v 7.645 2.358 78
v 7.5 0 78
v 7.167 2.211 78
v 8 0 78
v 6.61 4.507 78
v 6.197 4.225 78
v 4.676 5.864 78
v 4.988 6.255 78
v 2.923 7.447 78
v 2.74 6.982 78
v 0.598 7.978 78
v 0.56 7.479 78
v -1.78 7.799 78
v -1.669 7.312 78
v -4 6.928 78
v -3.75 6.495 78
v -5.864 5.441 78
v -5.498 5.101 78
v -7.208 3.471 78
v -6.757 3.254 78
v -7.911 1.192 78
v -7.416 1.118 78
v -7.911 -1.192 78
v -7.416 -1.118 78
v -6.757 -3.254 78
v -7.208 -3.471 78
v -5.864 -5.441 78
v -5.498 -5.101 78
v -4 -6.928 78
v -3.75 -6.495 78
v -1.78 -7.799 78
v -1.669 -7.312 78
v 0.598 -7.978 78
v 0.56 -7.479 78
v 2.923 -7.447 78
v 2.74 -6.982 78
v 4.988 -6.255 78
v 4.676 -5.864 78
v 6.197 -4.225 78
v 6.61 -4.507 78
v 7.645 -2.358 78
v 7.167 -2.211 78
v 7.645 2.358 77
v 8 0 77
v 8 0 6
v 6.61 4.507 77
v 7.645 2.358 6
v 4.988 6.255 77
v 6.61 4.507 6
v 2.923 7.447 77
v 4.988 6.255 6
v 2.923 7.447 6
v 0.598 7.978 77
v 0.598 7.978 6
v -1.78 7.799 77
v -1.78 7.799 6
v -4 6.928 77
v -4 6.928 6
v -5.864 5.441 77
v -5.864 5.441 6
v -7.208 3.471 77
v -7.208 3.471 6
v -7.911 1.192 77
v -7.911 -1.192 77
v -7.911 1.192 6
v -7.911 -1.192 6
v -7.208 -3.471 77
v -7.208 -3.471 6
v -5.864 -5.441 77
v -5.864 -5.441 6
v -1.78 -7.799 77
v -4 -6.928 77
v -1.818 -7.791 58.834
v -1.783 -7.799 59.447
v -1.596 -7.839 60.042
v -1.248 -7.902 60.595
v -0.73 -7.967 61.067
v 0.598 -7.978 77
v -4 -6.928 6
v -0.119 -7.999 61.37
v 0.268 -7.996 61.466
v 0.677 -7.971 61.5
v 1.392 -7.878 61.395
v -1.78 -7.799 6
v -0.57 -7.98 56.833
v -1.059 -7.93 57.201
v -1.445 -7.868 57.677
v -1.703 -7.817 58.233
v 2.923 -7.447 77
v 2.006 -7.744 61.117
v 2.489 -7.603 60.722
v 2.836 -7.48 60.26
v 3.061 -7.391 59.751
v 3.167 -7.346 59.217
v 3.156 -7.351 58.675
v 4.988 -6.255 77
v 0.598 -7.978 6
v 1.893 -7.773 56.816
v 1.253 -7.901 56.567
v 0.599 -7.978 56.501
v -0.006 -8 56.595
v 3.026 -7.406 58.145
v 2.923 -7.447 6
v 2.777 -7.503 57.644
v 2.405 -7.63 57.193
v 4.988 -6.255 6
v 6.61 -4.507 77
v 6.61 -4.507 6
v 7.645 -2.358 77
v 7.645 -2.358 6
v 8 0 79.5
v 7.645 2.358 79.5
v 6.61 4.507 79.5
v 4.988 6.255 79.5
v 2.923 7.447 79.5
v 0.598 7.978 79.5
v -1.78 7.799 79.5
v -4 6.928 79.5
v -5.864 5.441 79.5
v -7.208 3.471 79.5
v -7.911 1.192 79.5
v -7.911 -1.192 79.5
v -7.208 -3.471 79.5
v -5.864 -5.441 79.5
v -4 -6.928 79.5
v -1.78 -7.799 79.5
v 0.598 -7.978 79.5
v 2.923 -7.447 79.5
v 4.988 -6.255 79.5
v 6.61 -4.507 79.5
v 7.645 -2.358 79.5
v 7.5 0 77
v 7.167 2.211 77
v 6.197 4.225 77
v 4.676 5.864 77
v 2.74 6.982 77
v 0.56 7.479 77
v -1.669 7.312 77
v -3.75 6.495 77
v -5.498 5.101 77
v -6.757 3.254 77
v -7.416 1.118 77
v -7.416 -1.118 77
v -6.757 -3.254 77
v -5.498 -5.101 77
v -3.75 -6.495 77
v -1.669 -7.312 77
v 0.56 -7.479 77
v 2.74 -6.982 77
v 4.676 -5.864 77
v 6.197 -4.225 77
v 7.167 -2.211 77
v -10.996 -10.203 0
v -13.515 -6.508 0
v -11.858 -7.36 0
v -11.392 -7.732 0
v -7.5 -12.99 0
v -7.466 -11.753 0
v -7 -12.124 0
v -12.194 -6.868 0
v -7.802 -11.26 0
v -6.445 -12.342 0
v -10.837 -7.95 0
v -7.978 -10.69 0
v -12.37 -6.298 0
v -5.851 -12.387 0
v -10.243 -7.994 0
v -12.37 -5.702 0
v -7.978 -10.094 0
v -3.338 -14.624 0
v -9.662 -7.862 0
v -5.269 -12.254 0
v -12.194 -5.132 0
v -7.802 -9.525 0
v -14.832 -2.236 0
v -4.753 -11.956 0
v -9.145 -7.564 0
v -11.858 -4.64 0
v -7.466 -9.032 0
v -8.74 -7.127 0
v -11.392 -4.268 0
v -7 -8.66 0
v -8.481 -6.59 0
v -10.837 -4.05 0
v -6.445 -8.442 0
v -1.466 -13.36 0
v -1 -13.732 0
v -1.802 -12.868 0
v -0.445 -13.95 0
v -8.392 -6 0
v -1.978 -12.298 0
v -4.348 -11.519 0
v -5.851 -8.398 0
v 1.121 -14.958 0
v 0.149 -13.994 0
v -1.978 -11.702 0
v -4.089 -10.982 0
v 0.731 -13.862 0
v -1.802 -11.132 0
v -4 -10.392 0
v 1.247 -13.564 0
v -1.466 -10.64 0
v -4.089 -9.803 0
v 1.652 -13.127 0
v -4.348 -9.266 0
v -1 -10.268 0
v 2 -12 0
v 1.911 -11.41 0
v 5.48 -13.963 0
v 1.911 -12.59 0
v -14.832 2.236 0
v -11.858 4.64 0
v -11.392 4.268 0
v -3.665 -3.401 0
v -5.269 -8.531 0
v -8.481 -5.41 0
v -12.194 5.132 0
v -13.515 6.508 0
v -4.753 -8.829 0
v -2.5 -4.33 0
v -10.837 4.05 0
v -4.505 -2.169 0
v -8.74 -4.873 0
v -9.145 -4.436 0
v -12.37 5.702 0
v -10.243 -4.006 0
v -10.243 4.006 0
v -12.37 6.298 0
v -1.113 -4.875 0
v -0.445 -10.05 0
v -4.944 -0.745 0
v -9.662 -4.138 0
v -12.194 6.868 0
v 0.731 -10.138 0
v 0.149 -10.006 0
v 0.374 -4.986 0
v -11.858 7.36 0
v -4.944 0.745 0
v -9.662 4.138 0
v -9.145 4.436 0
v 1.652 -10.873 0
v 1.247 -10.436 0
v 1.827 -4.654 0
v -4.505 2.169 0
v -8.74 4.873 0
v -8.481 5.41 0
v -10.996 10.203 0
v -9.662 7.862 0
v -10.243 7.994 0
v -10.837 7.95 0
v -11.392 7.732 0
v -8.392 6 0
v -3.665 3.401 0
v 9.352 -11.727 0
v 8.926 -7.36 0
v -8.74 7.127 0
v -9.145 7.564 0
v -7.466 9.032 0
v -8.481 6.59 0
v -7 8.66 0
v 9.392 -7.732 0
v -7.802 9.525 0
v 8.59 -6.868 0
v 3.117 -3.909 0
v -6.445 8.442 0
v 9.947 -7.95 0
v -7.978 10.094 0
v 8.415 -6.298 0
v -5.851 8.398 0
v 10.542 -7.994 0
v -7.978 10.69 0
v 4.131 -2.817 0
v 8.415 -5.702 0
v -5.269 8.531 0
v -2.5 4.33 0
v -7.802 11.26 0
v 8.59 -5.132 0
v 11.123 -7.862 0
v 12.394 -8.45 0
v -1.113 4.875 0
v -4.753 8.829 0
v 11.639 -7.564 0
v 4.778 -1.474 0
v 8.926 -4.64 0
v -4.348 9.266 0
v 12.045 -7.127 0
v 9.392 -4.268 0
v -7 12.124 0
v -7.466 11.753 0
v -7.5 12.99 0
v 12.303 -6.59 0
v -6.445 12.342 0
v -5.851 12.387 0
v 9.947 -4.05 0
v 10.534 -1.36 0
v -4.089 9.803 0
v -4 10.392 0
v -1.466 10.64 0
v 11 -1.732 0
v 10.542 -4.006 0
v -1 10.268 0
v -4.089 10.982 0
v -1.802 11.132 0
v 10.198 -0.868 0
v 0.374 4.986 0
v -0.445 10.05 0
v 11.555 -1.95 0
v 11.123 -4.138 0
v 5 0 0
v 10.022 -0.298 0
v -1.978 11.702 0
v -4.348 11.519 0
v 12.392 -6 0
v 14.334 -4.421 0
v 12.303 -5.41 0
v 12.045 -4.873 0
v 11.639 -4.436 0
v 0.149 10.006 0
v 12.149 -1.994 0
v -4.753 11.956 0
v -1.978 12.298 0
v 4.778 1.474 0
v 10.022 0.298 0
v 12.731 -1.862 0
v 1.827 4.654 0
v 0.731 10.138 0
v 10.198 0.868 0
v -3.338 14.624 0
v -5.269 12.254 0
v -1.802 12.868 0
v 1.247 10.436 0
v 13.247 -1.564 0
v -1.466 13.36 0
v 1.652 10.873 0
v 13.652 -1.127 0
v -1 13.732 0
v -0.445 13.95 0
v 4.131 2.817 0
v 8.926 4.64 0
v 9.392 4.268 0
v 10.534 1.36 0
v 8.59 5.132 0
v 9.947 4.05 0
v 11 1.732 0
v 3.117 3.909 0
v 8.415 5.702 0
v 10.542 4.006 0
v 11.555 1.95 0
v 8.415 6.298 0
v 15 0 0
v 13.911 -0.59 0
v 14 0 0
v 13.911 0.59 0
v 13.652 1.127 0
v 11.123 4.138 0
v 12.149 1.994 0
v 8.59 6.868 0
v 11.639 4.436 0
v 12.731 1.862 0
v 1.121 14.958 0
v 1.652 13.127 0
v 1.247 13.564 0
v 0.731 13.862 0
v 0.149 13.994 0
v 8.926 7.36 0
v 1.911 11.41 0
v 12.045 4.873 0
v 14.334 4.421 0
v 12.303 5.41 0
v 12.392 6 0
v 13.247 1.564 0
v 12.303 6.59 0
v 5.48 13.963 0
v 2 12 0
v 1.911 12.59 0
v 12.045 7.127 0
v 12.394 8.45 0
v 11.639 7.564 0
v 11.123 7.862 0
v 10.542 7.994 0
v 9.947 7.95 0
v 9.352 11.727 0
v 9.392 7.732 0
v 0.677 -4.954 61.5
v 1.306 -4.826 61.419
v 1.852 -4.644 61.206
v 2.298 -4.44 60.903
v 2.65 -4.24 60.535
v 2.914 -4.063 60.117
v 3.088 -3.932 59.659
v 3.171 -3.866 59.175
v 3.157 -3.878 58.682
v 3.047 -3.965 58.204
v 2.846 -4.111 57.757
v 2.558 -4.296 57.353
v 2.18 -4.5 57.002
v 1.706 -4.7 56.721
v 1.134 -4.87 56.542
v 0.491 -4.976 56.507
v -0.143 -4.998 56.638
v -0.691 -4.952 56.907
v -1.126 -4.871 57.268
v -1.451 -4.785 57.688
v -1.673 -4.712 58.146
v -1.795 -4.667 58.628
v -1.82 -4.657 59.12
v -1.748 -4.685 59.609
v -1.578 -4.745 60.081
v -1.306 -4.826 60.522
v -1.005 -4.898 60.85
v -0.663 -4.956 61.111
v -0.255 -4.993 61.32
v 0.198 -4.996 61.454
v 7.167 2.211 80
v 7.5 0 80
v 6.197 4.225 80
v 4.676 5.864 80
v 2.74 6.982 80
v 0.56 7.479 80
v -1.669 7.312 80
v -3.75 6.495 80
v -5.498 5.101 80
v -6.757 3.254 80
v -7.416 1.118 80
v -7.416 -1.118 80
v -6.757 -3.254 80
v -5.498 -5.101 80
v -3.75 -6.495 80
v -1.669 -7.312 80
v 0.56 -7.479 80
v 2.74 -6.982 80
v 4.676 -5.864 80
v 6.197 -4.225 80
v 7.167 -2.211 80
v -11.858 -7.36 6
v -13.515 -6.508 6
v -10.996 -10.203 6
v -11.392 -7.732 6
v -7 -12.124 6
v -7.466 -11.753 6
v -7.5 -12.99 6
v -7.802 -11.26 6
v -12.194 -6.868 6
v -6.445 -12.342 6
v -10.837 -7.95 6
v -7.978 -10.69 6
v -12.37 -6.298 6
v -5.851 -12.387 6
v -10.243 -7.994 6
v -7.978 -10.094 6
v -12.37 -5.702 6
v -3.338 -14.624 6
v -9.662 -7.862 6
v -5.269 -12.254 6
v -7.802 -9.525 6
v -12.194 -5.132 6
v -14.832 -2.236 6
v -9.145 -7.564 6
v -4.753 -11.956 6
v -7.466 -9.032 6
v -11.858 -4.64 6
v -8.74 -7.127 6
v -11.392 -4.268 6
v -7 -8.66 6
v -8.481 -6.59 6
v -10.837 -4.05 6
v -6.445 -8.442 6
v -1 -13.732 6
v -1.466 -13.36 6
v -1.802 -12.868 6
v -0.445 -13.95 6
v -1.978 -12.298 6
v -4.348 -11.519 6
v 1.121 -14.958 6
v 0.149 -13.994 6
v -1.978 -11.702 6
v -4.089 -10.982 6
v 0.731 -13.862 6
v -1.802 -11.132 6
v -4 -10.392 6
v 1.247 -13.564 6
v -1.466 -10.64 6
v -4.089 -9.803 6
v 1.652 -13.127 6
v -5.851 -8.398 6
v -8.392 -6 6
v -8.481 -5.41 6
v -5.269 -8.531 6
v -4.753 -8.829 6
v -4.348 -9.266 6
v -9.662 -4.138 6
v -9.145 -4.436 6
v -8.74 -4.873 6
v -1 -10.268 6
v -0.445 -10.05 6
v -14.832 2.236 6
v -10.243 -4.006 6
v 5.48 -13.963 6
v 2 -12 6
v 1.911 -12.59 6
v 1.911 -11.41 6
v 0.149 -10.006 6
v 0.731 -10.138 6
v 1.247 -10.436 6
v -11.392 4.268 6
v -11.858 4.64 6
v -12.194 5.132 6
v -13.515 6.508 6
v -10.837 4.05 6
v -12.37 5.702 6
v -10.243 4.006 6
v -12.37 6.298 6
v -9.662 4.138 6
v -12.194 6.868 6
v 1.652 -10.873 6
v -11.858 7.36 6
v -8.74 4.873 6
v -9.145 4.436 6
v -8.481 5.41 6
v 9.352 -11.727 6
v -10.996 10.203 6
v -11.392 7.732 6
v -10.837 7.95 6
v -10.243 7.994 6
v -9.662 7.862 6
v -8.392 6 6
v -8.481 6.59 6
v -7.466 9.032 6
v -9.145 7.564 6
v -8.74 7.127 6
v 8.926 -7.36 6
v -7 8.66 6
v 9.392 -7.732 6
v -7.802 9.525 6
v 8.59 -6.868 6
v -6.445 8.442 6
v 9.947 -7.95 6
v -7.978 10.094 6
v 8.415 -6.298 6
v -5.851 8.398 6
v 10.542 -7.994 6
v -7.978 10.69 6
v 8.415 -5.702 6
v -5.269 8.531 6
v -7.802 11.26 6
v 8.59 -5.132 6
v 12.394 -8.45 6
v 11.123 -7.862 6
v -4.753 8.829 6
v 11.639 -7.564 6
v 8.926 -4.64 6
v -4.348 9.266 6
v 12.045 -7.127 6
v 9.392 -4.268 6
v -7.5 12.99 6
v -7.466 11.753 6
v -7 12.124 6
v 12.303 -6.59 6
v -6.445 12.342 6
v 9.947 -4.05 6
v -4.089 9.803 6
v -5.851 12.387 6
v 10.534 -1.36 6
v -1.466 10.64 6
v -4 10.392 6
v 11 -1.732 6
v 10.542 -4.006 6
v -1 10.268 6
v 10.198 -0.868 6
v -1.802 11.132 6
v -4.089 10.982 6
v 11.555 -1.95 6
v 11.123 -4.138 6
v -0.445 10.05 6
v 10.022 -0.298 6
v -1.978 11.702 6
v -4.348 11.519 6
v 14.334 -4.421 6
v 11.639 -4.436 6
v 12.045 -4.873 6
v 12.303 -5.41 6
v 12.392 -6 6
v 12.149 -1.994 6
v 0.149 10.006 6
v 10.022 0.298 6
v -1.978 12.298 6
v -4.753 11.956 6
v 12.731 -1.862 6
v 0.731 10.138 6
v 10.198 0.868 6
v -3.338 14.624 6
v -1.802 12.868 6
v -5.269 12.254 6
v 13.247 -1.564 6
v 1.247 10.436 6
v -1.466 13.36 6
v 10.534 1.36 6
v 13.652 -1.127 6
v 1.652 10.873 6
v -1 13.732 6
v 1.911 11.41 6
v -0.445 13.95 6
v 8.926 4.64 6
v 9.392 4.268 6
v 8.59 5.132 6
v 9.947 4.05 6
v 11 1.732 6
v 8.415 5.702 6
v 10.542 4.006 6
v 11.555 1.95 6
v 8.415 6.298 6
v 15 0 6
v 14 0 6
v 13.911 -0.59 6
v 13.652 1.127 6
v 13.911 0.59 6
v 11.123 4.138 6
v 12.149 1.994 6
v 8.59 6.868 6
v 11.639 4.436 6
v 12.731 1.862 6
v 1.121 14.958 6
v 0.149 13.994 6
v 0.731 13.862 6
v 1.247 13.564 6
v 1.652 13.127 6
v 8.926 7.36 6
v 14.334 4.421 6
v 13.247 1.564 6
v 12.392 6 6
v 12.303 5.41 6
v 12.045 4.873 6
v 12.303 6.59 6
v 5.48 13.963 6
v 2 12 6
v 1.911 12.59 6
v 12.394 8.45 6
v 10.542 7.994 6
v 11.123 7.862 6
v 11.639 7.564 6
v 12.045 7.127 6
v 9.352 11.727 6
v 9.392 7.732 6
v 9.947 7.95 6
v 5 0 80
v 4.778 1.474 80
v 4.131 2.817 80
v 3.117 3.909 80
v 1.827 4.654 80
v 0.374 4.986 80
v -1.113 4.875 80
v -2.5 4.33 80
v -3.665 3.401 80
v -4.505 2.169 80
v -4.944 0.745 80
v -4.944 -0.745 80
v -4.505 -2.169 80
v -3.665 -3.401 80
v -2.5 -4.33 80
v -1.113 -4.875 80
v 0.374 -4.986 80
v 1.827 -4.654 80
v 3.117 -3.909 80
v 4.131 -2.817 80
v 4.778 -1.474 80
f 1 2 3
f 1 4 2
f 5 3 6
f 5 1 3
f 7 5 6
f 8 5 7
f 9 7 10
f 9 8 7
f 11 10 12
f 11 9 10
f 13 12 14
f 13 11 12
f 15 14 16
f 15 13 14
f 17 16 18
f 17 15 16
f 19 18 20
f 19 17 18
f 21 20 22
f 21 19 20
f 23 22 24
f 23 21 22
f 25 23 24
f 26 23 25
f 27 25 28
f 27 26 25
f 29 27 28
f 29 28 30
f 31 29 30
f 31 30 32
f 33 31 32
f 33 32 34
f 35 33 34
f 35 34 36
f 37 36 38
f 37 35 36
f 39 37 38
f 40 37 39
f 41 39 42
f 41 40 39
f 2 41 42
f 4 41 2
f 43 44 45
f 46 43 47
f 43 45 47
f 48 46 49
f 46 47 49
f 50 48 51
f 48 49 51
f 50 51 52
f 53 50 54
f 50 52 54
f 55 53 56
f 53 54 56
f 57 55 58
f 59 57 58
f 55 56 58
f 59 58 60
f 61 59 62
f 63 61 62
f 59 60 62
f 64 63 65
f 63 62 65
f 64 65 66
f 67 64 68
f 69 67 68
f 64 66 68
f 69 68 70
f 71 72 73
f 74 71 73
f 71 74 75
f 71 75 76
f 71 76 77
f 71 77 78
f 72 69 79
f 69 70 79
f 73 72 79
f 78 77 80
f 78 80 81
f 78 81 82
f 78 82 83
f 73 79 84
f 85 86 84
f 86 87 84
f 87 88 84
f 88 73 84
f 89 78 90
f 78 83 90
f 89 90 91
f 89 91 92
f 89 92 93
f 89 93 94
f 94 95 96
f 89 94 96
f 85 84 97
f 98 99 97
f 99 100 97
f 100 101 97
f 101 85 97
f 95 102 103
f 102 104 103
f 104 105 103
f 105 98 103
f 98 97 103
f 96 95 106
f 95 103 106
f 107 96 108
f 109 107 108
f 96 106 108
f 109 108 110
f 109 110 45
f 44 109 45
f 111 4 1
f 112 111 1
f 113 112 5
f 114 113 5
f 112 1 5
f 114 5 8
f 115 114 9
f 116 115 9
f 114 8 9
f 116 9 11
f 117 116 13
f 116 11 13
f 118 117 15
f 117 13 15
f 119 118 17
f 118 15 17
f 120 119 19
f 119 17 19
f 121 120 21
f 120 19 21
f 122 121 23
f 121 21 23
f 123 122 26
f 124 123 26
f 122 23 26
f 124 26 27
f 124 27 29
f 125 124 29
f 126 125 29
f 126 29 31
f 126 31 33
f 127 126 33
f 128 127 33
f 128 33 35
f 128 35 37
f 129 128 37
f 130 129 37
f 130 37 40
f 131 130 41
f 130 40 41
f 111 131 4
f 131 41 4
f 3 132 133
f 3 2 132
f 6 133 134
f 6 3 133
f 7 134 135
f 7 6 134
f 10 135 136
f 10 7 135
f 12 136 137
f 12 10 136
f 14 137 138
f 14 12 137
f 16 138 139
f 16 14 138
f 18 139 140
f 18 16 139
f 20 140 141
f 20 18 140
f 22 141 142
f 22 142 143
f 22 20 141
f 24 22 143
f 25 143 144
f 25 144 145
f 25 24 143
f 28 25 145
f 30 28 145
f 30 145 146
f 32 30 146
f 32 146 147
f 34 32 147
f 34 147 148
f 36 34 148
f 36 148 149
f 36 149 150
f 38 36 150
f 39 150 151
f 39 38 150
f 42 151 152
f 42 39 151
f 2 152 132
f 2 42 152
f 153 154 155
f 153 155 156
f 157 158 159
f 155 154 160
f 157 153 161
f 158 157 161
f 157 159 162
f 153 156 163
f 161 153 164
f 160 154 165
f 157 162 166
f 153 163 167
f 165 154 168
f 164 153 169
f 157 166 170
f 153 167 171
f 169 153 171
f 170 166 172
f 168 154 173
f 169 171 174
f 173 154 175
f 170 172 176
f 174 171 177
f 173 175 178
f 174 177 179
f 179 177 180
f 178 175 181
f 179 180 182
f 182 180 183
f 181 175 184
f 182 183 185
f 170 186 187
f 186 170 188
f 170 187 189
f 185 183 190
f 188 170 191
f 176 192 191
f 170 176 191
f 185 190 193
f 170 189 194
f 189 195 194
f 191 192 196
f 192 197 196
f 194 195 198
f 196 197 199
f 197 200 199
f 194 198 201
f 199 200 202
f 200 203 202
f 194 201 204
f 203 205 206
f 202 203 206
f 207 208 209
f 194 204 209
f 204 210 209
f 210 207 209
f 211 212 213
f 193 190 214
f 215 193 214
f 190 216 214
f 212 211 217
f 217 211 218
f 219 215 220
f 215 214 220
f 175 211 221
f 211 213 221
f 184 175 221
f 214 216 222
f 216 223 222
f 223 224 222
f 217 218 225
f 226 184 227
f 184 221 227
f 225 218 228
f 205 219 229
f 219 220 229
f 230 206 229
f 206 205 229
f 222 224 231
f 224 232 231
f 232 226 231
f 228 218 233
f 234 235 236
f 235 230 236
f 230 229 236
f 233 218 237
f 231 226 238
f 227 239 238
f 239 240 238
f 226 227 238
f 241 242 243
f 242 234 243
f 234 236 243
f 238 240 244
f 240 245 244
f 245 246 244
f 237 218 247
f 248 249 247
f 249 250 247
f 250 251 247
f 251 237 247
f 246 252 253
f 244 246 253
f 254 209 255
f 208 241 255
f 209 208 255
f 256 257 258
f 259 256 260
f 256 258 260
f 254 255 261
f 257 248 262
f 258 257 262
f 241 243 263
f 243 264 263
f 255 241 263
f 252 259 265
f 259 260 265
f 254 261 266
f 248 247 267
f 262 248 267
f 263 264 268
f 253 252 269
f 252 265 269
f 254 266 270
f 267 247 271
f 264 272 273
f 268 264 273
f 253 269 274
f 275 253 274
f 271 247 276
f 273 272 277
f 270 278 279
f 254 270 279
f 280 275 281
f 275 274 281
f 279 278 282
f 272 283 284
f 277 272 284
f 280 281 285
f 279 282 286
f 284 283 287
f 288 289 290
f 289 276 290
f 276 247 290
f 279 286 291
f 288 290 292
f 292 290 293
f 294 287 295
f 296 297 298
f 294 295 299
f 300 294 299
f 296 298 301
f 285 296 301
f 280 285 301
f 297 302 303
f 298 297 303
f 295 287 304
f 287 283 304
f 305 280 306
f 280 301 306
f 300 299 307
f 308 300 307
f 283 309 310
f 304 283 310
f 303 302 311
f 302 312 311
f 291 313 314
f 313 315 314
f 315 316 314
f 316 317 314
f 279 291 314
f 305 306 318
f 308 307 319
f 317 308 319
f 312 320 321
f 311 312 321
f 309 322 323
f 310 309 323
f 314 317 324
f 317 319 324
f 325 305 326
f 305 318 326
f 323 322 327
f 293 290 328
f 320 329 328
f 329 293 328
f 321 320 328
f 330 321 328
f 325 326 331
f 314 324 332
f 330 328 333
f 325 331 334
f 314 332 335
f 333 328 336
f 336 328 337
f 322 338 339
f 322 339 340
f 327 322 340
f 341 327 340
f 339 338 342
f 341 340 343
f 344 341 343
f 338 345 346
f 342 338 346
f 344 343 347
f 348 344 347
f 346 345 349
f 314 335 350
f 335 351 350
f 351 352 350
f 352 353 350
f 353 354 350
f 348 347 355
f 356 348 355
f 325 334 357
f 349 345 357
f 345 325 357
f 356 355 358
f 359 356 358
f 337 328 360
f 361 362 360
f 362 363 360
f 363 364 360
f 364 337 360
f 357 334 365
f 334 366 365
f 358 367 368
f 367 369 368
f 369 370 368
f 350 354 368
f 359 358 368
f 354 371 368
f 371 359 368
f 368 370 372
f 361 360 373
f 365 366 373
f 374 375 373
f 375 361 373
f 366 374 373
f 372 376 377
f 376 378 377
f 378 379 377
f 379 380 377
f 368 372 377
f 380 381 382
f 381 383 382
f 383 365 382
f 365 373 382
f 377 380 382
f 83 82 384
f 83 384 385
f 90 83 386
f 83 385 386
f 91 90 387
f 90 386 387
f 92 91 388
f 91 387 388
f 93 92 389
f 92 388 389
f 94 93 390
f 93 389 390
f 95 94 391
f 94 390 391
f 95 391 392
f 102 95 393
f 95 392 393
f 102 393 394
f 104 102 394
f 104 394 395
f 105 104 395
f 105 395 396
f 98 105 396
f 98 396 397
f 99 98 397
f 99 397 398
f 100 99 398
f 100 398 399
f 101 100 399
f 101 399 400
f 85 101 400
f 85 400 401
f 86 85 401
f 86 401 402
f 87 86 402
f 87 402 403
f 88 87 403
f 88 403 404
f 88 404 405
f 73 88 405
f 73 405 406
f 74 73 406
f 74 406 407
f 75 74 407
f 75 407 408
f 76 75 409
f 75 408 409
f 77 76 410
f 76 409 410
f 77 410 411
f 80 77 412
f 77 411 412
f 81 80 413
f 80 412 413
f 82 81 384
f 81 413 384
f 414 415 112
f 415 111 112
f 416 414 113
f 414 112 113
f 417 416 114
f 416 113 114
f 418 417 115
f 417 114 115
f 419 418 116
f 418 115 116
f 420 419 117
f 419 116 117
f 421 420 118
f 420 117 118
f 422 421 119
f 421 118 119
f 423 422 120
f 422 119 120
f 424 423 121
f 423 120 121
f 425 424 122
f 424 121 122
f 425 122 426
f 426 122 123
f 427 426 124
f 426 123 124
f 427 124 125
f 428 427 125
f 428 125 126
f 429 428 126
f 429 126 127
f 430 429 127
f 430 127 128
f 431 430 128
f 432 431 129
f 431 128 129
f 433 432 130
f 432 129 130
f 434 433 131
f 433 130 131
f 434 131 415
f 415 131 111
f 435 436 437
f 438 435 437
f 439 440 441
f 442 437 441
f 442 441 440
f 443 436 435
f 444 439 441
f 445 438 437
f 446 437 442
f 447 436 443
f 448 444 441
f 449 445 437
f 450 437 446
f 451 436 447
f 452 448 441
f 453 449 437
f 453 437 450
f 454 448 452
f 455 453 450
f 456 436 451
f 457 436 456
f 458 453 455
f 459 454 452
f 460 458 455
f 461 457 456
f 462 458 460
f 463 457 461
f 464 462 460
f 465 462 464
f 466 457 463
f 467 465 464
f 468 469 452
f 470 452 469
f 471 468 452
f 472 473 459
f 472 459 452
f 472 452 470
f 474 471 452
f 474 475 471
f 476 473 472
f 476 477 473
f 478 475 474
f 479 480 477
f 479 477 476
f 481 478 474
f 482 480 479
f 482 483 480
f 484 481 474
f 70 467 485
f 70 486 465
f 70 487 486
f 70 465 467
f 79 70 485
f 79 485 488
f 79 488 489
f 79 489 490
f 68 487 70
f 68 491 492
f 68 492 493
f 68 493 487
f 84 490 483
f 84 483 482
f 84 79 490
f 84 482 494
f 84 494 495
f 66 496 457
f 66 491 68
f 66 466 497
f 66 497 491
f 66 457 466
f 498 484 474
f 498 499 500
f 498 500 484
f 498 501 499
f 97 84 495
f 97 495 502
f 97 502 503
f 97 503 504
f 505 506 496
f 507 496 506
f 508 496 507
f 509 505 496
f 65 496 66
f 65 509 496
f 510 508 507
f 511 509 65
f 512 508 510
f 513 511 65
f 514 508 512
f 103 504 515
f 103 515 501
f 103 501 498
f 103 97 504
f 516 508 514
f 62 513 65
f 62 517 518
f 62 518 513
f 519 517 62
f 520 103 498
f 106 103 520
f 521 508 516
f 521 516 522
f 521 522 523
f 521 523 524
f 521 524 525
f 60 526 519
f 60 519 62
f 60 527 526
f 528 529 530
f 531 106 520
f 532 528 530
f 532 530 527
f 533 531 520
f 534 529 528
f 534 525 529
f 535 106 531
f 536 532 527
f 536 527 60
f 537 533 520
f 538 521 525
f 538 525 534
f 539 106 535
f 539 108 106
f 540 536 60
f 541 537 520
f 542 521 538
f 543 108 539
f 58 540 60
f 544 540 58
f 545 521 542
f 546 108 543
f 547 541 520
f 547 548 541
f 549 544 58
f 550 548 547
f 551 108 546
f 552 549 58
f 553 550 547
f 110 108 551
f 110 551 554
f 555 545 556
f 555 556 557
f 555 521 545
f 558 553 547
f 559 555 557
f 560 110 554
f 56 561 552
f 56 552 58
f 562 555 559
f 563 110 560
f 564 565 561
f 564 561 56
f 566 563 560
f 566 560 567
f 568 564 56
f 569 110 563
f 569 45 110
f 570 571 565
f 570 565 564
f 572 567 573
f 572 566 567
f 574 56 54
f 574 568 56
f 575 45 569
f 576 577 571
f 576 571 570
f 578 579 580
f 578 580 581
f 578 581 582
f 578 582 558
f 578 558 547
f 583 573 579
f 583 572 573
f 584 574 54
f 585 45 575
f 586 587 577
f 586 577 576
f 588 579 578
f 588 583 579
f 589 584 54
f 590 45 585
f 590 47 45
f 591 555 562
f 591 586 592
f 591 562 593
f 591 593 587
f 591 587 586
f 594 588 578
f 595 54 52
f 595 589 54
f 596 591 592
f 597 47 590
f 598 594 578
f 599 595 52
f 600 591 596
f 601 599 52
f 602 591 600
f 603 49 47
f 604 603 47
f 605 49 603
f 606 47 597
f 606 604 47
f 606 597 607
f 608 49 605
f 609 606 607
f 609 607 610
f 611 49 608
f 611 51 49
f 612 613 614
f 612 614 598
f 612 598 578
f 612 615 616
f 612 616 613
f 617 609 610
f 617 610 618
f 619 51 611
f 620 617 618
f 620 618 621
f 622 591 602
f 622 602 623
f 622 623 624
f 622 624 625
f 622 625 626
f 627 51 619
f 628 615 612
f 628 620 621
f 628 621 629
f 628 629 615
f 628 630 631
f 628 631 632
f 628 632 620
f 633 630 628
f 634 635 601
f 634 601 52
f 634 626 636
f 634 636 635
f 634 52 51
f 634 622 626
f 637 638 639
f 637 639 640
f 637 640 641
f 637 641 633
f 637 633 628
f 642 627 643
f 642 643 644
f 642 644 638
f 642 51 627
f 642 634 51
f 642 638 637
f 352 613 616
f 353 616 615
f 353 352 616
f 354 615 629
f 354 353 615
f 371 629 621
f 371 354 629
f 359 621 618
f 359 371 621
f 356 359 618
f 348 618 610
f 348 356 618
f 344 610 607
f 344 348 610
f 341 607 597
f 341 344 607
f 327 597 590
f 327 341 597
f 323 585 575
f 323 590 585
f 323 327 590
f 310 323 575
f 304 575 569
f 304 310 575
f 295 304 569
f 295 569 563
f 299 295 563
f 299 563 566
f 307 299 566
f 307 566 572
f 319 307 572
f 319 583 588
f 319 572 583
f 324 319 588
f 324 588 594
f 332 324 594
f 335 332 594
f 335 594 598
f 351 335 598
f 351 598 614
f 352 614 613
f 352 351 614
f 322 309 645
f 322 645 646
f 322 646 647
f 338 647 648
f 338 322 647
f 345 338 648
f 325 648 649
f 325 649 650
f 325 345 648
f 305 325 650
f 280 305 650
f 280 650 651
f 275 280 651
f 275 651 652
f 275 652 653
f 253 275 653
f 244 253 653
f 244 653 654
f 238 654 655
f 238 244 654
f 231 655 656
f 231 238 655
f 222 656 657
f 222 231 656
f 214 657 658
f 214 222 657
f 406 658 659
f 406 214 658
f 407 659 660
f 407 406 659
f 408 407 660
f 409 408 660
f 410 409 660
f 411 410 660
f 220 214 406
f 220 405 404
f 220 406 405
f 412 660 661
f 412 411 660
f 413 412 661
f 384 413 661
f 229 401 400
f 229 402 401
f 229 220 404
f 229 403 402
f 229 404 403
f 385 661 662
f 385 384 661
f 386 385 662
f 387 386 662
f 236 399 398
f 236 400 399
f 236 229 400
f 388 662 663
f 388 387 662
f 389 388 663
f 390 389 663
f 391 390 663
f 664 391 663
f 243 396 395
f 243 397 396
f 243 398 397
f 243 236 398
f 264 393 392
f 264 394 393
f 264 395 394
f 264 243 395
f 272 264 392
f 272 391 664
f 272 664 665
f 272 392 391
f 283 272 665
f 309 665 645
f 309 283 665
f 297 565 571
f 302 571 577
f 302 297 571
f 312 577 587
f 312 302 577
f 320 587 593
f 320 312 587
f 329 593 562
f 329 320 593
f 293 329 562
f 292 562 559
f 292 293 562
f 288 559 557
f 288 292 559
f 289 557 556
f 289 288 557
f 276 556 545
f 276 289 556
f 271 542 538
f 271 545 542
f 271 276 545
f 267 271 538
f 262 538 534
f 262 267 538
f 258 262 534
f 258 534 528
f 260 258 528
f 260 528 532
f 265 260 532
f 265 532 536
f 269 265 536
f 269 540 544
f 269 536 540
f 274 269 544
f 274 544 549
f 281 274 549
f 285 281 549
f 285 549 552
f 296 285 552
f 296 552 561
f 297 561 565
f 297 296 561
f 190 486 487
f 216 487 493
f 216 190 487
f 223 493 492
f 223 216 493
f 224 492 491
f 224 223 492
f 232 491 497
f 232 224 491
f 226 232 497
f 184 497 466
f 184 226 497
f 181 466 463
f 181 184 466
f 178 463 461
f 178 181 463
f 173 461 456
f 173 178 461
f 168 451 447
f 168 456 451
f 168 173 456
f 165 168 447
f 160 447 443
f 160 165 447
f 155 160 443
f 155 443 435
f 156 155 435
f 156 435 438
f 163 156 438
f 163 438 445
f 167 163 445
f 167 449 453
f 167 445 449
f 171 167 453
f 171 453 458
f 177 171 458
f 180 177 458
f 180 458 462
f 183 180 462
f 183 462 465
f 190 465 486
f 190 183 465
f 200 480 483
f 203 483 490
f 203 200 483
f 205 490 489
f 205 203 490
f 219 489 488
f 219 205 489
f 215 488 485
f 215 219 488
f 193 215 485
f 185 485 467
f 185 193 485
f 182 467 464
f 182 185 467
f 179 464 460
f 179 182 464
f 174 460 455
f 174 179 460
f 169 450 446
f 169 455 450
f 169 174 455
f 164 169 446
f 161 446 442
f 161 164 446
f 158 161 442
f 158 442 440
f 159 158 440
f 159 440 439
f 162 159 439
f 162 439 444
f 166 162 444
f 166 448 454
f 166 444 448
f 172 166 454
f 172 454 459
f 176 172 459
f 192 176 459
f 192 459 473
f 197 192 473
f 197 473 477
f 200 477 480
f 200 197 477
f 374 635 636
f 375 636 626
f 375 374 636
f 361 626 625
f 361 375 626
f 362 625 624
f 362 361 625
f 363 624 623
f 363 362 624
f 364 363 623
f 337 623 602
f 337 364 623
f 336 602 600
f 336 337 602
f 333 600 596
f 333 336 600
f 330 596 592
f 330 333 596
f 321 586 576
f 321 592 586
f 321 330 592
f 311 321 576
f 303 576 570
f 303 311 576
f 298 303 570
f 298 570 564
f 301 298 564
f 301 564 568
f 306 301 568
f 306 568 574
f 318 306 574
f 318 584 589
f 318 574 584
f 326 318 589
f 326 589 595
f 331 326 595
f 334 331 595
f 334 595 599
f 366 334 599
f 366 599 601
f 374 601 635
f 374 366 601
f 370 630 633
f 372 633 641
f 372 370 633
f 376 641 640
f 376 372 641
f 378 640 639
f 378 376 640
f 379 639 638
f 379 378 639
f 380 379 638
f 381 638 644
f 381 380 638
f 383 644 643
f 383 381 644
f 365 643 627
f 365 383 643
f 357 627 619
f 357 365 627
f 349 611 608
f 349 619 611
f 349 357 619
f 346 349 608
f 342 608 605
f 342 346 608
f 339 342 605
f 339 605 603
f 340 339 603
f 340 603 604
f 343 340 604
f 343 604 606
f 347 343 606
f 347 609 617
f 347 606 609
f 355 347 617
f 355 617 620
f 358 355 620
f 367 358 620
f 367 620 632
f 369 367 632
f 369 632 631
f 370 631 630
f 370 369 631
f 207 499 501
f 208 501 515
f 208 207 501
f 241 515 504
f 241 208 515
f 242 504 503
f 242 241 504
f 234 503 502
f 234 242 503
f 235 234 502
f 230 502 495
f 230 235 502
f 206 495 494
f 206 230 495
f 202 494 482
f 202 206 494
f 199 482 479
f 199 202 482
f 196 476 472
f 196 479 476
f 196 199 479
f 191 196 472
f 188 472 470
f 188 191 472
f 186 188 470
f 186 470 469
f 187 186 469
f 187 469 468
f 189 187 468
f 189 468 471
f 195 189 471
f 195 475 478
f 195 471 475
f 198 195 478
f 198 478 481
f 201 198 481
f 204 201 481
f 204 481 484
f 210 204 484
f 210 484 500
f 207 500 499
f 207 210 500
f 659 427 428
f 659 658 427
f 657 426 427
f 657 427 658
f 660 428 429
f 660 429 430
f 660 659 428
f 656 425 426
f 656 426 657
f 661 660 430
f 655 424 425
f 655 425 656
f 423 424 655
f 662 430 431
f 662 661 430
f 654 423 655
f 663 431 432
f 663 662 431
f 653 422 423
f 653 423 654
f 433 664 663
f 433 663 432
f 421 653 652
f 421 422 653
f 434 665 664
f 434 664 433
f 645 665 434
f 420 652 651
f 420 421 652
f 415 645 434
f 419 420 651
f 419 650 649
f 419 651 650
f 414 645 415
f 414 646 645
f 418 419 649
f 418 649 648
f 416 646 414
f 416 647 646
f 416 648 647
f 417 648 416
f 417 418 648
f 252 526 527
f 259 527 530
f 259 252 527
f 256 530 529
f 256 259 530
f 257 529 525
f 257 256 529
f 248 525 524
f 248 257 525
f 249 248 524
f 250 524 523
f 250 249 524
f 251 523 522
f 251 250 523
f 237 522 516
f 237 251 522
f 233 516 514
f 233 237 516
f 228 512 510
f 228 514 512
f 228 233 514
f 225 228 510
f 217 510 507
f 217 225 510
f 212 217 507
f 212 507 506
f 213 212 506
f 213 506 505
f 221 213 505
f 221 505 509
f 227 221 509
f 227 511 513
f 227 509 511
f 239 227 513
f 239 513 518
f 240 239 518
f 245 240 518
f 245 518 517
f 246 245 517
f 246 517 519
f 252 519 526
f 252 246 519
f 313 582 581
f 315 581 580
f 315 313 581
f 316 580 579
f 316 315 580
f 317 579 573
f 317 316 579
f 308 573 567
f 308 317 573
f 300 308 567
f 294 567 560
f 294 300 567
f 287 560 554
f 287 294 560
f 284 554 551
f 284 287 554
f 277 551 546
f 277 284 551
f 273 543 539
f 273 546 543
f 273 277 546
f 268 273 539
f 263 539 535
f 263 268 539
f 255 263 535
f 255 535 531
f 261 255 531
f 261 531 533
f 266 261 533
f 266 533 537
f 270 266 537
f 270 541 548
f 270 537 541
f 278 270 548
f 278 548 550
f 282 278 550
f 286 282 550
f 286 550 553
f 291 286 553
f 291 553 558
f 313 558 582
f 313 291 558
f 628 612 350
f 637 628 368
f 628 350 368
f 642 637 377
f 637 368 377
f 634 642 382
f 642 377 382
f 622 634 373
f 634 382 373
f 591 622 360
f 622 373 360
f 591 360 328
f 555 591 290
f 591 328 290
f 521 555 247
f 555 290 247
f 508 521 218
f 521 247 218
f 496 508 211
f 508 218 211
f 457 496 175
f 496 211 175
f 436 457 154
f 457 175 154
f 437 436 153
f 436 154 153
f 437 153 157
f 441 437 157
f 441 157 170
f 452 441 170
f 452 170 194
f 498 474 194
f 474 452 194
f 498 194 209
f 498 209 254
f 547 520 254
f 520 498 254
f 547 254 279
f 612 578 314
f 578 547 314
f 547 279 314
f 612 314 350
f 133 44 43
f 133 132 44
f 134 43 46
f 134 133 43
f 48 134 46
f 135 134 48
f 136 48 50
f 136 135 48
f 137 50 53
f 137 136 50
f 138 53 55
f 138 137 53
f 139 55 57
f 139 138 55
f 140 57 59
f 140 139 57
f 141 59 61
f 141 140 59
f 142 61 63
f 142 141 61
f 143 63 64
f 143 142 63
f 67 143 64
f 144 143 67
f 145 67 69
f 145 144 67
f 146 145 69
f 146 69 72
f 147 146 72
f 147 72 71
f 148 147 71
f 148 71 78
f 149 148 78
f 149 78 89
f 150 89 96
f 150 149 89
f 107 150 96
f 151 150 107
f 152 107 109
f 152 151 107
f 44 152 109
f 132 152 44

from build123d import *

# Parameters (mm, degrees)
SKETCH_1_R          = 15
SKETCH_1_R_2        = 2
SKETCH_1_R_3        = 5
EXTRUDE_1_DEPTH     = 10
SKETCH_2_R          = 8
SKETCH_2_R_2        = 5
EXTRUDE_2_DEPTH     = 70
SKETCH_3_R          = 2.5
CUT_EXTRUDE_1_DEPTH = 10
CUT_EXTRUDE_START   = -4
SKETCH_4_R          = 18.074037985
SKETCH_4_R_2        = 8
CUT_EXTRUDE_2_DEPTH = 4
CHAMFER_1_SIZE      = 0.5
SKETCH_5_W          = 0.5
SKETCH_5_H          = 1


with BuildPart() as part:
    # 草图1 → 凸台-拉伸1 (new body)
    with BuildSketch(Plane.XY):
        Circle(SKETCH_1_R)
        with Locations((0, 12)):
            Circle(SKETCH_1_R_2, mode=Mode.SUBTRACT)
        with Locations((10.392304845, 6)):
            Circle(SKETCH_1_R_2, mode=Mode.SUBTRACT)
        with Locations((10.392304845, -6)):
            Circle(SKETCH_1_R_2, mode=Mode.SUBTRACT)
        with Locations((0, -12)):
            Circle(SKETCH_1_R_2, mode=Mode.SUBTRACT)
        with Locations((-10.392304845, -6)):
            Circle(SKETCH_1_R_2, mode=Mode.SUBTRACT)
        with Locations((-10.392304845, 6)):
            Circle(SKETCH_1_R_2, mode=Mode.SUBTRACT)
        with Locations((-6, 10.392304845)):
            Circle(SKETCH_1_R_2, mode=Mode.SUBTRACT)
        with Locations((12, 0)):
            Circle(SKETCH_1_R_2, mode=Mode.SUBTRACT)
        with Locations((-6, -10.392304845)):
            Circle(SKETCH_1_R_2, mode=Mode.SUBTRACT)
        Circle(SKETCH_1_R_3, mode=Mode.SUBTRACT)
    extrude(amount=EXTRUDE_1_DEPTH)

    # 草图2 → 凸台-拉伸2 (add)
    with BuildSketch(Plane.XY.offset(10)):
        Circle(SKETCH_2_R)
        Circle(SKETCH_2_R_2, mode=Mode.SUBTRACT)
    extrude(amount=EXTRUDE_2_DEPTH)

    # 草图3 → 切除-拉伸1 (cut)
    with BuildSketch(Plane(origin=(0, 0, 0), x_dir=(1, 0, 0), z_dir=(0, 1, 0))):
        with Locations((0.676832819, -59)):
            Circle(SKETCH_3_R)
    extrude(amount=-CUT_EXTRUDE_1_DEPTH, mode=Mode.SUBTRACT)

    # 草图4 → 切除-拉伸2 (cut)
    with BuildSketch(Plane.XY.offset(10).offset(CUT_EXTRUDE_START)):
        Circle(SKETCH_4_R)
        Circle(SKETCH_4_R_2, mode=Mode.SUBTRACT)
    extrude(amount=CUT_EXTRUDE_2_DEPTH, mode=Mode.SUBTRACT)

    # Chamfer 1
    chamfer_1_edges = [part.edges().sort_by_distance(p)[0] for p in [
        (-8, 0, 80),
    ]]
    chamfer(chamfer_1_edges, length=CHAMFER_1_SIZE)

    # 切除-扫描2: sweep along a path in 草图6
    with BuildLine(Plane.XY.offset(80)) as sweep_2_path:
        CenterArc((0, 0), 7.5, 0, 360)
    # 草图5 → 切除-扫描2 (sweep, cut)
    with BuildSketch(Plane(origin=(0, 0, 0), x_dir=(1, 0, 0), z_dir=(0, 1, 0))):
        with Locations((7.75, -77.5)):
            Rectangle(SKETCH_5_W, SKETCH_5_H)
    sweep(path=sweep_2_path.line, mode=Mode.SUBTRACT)


solid = part.part
